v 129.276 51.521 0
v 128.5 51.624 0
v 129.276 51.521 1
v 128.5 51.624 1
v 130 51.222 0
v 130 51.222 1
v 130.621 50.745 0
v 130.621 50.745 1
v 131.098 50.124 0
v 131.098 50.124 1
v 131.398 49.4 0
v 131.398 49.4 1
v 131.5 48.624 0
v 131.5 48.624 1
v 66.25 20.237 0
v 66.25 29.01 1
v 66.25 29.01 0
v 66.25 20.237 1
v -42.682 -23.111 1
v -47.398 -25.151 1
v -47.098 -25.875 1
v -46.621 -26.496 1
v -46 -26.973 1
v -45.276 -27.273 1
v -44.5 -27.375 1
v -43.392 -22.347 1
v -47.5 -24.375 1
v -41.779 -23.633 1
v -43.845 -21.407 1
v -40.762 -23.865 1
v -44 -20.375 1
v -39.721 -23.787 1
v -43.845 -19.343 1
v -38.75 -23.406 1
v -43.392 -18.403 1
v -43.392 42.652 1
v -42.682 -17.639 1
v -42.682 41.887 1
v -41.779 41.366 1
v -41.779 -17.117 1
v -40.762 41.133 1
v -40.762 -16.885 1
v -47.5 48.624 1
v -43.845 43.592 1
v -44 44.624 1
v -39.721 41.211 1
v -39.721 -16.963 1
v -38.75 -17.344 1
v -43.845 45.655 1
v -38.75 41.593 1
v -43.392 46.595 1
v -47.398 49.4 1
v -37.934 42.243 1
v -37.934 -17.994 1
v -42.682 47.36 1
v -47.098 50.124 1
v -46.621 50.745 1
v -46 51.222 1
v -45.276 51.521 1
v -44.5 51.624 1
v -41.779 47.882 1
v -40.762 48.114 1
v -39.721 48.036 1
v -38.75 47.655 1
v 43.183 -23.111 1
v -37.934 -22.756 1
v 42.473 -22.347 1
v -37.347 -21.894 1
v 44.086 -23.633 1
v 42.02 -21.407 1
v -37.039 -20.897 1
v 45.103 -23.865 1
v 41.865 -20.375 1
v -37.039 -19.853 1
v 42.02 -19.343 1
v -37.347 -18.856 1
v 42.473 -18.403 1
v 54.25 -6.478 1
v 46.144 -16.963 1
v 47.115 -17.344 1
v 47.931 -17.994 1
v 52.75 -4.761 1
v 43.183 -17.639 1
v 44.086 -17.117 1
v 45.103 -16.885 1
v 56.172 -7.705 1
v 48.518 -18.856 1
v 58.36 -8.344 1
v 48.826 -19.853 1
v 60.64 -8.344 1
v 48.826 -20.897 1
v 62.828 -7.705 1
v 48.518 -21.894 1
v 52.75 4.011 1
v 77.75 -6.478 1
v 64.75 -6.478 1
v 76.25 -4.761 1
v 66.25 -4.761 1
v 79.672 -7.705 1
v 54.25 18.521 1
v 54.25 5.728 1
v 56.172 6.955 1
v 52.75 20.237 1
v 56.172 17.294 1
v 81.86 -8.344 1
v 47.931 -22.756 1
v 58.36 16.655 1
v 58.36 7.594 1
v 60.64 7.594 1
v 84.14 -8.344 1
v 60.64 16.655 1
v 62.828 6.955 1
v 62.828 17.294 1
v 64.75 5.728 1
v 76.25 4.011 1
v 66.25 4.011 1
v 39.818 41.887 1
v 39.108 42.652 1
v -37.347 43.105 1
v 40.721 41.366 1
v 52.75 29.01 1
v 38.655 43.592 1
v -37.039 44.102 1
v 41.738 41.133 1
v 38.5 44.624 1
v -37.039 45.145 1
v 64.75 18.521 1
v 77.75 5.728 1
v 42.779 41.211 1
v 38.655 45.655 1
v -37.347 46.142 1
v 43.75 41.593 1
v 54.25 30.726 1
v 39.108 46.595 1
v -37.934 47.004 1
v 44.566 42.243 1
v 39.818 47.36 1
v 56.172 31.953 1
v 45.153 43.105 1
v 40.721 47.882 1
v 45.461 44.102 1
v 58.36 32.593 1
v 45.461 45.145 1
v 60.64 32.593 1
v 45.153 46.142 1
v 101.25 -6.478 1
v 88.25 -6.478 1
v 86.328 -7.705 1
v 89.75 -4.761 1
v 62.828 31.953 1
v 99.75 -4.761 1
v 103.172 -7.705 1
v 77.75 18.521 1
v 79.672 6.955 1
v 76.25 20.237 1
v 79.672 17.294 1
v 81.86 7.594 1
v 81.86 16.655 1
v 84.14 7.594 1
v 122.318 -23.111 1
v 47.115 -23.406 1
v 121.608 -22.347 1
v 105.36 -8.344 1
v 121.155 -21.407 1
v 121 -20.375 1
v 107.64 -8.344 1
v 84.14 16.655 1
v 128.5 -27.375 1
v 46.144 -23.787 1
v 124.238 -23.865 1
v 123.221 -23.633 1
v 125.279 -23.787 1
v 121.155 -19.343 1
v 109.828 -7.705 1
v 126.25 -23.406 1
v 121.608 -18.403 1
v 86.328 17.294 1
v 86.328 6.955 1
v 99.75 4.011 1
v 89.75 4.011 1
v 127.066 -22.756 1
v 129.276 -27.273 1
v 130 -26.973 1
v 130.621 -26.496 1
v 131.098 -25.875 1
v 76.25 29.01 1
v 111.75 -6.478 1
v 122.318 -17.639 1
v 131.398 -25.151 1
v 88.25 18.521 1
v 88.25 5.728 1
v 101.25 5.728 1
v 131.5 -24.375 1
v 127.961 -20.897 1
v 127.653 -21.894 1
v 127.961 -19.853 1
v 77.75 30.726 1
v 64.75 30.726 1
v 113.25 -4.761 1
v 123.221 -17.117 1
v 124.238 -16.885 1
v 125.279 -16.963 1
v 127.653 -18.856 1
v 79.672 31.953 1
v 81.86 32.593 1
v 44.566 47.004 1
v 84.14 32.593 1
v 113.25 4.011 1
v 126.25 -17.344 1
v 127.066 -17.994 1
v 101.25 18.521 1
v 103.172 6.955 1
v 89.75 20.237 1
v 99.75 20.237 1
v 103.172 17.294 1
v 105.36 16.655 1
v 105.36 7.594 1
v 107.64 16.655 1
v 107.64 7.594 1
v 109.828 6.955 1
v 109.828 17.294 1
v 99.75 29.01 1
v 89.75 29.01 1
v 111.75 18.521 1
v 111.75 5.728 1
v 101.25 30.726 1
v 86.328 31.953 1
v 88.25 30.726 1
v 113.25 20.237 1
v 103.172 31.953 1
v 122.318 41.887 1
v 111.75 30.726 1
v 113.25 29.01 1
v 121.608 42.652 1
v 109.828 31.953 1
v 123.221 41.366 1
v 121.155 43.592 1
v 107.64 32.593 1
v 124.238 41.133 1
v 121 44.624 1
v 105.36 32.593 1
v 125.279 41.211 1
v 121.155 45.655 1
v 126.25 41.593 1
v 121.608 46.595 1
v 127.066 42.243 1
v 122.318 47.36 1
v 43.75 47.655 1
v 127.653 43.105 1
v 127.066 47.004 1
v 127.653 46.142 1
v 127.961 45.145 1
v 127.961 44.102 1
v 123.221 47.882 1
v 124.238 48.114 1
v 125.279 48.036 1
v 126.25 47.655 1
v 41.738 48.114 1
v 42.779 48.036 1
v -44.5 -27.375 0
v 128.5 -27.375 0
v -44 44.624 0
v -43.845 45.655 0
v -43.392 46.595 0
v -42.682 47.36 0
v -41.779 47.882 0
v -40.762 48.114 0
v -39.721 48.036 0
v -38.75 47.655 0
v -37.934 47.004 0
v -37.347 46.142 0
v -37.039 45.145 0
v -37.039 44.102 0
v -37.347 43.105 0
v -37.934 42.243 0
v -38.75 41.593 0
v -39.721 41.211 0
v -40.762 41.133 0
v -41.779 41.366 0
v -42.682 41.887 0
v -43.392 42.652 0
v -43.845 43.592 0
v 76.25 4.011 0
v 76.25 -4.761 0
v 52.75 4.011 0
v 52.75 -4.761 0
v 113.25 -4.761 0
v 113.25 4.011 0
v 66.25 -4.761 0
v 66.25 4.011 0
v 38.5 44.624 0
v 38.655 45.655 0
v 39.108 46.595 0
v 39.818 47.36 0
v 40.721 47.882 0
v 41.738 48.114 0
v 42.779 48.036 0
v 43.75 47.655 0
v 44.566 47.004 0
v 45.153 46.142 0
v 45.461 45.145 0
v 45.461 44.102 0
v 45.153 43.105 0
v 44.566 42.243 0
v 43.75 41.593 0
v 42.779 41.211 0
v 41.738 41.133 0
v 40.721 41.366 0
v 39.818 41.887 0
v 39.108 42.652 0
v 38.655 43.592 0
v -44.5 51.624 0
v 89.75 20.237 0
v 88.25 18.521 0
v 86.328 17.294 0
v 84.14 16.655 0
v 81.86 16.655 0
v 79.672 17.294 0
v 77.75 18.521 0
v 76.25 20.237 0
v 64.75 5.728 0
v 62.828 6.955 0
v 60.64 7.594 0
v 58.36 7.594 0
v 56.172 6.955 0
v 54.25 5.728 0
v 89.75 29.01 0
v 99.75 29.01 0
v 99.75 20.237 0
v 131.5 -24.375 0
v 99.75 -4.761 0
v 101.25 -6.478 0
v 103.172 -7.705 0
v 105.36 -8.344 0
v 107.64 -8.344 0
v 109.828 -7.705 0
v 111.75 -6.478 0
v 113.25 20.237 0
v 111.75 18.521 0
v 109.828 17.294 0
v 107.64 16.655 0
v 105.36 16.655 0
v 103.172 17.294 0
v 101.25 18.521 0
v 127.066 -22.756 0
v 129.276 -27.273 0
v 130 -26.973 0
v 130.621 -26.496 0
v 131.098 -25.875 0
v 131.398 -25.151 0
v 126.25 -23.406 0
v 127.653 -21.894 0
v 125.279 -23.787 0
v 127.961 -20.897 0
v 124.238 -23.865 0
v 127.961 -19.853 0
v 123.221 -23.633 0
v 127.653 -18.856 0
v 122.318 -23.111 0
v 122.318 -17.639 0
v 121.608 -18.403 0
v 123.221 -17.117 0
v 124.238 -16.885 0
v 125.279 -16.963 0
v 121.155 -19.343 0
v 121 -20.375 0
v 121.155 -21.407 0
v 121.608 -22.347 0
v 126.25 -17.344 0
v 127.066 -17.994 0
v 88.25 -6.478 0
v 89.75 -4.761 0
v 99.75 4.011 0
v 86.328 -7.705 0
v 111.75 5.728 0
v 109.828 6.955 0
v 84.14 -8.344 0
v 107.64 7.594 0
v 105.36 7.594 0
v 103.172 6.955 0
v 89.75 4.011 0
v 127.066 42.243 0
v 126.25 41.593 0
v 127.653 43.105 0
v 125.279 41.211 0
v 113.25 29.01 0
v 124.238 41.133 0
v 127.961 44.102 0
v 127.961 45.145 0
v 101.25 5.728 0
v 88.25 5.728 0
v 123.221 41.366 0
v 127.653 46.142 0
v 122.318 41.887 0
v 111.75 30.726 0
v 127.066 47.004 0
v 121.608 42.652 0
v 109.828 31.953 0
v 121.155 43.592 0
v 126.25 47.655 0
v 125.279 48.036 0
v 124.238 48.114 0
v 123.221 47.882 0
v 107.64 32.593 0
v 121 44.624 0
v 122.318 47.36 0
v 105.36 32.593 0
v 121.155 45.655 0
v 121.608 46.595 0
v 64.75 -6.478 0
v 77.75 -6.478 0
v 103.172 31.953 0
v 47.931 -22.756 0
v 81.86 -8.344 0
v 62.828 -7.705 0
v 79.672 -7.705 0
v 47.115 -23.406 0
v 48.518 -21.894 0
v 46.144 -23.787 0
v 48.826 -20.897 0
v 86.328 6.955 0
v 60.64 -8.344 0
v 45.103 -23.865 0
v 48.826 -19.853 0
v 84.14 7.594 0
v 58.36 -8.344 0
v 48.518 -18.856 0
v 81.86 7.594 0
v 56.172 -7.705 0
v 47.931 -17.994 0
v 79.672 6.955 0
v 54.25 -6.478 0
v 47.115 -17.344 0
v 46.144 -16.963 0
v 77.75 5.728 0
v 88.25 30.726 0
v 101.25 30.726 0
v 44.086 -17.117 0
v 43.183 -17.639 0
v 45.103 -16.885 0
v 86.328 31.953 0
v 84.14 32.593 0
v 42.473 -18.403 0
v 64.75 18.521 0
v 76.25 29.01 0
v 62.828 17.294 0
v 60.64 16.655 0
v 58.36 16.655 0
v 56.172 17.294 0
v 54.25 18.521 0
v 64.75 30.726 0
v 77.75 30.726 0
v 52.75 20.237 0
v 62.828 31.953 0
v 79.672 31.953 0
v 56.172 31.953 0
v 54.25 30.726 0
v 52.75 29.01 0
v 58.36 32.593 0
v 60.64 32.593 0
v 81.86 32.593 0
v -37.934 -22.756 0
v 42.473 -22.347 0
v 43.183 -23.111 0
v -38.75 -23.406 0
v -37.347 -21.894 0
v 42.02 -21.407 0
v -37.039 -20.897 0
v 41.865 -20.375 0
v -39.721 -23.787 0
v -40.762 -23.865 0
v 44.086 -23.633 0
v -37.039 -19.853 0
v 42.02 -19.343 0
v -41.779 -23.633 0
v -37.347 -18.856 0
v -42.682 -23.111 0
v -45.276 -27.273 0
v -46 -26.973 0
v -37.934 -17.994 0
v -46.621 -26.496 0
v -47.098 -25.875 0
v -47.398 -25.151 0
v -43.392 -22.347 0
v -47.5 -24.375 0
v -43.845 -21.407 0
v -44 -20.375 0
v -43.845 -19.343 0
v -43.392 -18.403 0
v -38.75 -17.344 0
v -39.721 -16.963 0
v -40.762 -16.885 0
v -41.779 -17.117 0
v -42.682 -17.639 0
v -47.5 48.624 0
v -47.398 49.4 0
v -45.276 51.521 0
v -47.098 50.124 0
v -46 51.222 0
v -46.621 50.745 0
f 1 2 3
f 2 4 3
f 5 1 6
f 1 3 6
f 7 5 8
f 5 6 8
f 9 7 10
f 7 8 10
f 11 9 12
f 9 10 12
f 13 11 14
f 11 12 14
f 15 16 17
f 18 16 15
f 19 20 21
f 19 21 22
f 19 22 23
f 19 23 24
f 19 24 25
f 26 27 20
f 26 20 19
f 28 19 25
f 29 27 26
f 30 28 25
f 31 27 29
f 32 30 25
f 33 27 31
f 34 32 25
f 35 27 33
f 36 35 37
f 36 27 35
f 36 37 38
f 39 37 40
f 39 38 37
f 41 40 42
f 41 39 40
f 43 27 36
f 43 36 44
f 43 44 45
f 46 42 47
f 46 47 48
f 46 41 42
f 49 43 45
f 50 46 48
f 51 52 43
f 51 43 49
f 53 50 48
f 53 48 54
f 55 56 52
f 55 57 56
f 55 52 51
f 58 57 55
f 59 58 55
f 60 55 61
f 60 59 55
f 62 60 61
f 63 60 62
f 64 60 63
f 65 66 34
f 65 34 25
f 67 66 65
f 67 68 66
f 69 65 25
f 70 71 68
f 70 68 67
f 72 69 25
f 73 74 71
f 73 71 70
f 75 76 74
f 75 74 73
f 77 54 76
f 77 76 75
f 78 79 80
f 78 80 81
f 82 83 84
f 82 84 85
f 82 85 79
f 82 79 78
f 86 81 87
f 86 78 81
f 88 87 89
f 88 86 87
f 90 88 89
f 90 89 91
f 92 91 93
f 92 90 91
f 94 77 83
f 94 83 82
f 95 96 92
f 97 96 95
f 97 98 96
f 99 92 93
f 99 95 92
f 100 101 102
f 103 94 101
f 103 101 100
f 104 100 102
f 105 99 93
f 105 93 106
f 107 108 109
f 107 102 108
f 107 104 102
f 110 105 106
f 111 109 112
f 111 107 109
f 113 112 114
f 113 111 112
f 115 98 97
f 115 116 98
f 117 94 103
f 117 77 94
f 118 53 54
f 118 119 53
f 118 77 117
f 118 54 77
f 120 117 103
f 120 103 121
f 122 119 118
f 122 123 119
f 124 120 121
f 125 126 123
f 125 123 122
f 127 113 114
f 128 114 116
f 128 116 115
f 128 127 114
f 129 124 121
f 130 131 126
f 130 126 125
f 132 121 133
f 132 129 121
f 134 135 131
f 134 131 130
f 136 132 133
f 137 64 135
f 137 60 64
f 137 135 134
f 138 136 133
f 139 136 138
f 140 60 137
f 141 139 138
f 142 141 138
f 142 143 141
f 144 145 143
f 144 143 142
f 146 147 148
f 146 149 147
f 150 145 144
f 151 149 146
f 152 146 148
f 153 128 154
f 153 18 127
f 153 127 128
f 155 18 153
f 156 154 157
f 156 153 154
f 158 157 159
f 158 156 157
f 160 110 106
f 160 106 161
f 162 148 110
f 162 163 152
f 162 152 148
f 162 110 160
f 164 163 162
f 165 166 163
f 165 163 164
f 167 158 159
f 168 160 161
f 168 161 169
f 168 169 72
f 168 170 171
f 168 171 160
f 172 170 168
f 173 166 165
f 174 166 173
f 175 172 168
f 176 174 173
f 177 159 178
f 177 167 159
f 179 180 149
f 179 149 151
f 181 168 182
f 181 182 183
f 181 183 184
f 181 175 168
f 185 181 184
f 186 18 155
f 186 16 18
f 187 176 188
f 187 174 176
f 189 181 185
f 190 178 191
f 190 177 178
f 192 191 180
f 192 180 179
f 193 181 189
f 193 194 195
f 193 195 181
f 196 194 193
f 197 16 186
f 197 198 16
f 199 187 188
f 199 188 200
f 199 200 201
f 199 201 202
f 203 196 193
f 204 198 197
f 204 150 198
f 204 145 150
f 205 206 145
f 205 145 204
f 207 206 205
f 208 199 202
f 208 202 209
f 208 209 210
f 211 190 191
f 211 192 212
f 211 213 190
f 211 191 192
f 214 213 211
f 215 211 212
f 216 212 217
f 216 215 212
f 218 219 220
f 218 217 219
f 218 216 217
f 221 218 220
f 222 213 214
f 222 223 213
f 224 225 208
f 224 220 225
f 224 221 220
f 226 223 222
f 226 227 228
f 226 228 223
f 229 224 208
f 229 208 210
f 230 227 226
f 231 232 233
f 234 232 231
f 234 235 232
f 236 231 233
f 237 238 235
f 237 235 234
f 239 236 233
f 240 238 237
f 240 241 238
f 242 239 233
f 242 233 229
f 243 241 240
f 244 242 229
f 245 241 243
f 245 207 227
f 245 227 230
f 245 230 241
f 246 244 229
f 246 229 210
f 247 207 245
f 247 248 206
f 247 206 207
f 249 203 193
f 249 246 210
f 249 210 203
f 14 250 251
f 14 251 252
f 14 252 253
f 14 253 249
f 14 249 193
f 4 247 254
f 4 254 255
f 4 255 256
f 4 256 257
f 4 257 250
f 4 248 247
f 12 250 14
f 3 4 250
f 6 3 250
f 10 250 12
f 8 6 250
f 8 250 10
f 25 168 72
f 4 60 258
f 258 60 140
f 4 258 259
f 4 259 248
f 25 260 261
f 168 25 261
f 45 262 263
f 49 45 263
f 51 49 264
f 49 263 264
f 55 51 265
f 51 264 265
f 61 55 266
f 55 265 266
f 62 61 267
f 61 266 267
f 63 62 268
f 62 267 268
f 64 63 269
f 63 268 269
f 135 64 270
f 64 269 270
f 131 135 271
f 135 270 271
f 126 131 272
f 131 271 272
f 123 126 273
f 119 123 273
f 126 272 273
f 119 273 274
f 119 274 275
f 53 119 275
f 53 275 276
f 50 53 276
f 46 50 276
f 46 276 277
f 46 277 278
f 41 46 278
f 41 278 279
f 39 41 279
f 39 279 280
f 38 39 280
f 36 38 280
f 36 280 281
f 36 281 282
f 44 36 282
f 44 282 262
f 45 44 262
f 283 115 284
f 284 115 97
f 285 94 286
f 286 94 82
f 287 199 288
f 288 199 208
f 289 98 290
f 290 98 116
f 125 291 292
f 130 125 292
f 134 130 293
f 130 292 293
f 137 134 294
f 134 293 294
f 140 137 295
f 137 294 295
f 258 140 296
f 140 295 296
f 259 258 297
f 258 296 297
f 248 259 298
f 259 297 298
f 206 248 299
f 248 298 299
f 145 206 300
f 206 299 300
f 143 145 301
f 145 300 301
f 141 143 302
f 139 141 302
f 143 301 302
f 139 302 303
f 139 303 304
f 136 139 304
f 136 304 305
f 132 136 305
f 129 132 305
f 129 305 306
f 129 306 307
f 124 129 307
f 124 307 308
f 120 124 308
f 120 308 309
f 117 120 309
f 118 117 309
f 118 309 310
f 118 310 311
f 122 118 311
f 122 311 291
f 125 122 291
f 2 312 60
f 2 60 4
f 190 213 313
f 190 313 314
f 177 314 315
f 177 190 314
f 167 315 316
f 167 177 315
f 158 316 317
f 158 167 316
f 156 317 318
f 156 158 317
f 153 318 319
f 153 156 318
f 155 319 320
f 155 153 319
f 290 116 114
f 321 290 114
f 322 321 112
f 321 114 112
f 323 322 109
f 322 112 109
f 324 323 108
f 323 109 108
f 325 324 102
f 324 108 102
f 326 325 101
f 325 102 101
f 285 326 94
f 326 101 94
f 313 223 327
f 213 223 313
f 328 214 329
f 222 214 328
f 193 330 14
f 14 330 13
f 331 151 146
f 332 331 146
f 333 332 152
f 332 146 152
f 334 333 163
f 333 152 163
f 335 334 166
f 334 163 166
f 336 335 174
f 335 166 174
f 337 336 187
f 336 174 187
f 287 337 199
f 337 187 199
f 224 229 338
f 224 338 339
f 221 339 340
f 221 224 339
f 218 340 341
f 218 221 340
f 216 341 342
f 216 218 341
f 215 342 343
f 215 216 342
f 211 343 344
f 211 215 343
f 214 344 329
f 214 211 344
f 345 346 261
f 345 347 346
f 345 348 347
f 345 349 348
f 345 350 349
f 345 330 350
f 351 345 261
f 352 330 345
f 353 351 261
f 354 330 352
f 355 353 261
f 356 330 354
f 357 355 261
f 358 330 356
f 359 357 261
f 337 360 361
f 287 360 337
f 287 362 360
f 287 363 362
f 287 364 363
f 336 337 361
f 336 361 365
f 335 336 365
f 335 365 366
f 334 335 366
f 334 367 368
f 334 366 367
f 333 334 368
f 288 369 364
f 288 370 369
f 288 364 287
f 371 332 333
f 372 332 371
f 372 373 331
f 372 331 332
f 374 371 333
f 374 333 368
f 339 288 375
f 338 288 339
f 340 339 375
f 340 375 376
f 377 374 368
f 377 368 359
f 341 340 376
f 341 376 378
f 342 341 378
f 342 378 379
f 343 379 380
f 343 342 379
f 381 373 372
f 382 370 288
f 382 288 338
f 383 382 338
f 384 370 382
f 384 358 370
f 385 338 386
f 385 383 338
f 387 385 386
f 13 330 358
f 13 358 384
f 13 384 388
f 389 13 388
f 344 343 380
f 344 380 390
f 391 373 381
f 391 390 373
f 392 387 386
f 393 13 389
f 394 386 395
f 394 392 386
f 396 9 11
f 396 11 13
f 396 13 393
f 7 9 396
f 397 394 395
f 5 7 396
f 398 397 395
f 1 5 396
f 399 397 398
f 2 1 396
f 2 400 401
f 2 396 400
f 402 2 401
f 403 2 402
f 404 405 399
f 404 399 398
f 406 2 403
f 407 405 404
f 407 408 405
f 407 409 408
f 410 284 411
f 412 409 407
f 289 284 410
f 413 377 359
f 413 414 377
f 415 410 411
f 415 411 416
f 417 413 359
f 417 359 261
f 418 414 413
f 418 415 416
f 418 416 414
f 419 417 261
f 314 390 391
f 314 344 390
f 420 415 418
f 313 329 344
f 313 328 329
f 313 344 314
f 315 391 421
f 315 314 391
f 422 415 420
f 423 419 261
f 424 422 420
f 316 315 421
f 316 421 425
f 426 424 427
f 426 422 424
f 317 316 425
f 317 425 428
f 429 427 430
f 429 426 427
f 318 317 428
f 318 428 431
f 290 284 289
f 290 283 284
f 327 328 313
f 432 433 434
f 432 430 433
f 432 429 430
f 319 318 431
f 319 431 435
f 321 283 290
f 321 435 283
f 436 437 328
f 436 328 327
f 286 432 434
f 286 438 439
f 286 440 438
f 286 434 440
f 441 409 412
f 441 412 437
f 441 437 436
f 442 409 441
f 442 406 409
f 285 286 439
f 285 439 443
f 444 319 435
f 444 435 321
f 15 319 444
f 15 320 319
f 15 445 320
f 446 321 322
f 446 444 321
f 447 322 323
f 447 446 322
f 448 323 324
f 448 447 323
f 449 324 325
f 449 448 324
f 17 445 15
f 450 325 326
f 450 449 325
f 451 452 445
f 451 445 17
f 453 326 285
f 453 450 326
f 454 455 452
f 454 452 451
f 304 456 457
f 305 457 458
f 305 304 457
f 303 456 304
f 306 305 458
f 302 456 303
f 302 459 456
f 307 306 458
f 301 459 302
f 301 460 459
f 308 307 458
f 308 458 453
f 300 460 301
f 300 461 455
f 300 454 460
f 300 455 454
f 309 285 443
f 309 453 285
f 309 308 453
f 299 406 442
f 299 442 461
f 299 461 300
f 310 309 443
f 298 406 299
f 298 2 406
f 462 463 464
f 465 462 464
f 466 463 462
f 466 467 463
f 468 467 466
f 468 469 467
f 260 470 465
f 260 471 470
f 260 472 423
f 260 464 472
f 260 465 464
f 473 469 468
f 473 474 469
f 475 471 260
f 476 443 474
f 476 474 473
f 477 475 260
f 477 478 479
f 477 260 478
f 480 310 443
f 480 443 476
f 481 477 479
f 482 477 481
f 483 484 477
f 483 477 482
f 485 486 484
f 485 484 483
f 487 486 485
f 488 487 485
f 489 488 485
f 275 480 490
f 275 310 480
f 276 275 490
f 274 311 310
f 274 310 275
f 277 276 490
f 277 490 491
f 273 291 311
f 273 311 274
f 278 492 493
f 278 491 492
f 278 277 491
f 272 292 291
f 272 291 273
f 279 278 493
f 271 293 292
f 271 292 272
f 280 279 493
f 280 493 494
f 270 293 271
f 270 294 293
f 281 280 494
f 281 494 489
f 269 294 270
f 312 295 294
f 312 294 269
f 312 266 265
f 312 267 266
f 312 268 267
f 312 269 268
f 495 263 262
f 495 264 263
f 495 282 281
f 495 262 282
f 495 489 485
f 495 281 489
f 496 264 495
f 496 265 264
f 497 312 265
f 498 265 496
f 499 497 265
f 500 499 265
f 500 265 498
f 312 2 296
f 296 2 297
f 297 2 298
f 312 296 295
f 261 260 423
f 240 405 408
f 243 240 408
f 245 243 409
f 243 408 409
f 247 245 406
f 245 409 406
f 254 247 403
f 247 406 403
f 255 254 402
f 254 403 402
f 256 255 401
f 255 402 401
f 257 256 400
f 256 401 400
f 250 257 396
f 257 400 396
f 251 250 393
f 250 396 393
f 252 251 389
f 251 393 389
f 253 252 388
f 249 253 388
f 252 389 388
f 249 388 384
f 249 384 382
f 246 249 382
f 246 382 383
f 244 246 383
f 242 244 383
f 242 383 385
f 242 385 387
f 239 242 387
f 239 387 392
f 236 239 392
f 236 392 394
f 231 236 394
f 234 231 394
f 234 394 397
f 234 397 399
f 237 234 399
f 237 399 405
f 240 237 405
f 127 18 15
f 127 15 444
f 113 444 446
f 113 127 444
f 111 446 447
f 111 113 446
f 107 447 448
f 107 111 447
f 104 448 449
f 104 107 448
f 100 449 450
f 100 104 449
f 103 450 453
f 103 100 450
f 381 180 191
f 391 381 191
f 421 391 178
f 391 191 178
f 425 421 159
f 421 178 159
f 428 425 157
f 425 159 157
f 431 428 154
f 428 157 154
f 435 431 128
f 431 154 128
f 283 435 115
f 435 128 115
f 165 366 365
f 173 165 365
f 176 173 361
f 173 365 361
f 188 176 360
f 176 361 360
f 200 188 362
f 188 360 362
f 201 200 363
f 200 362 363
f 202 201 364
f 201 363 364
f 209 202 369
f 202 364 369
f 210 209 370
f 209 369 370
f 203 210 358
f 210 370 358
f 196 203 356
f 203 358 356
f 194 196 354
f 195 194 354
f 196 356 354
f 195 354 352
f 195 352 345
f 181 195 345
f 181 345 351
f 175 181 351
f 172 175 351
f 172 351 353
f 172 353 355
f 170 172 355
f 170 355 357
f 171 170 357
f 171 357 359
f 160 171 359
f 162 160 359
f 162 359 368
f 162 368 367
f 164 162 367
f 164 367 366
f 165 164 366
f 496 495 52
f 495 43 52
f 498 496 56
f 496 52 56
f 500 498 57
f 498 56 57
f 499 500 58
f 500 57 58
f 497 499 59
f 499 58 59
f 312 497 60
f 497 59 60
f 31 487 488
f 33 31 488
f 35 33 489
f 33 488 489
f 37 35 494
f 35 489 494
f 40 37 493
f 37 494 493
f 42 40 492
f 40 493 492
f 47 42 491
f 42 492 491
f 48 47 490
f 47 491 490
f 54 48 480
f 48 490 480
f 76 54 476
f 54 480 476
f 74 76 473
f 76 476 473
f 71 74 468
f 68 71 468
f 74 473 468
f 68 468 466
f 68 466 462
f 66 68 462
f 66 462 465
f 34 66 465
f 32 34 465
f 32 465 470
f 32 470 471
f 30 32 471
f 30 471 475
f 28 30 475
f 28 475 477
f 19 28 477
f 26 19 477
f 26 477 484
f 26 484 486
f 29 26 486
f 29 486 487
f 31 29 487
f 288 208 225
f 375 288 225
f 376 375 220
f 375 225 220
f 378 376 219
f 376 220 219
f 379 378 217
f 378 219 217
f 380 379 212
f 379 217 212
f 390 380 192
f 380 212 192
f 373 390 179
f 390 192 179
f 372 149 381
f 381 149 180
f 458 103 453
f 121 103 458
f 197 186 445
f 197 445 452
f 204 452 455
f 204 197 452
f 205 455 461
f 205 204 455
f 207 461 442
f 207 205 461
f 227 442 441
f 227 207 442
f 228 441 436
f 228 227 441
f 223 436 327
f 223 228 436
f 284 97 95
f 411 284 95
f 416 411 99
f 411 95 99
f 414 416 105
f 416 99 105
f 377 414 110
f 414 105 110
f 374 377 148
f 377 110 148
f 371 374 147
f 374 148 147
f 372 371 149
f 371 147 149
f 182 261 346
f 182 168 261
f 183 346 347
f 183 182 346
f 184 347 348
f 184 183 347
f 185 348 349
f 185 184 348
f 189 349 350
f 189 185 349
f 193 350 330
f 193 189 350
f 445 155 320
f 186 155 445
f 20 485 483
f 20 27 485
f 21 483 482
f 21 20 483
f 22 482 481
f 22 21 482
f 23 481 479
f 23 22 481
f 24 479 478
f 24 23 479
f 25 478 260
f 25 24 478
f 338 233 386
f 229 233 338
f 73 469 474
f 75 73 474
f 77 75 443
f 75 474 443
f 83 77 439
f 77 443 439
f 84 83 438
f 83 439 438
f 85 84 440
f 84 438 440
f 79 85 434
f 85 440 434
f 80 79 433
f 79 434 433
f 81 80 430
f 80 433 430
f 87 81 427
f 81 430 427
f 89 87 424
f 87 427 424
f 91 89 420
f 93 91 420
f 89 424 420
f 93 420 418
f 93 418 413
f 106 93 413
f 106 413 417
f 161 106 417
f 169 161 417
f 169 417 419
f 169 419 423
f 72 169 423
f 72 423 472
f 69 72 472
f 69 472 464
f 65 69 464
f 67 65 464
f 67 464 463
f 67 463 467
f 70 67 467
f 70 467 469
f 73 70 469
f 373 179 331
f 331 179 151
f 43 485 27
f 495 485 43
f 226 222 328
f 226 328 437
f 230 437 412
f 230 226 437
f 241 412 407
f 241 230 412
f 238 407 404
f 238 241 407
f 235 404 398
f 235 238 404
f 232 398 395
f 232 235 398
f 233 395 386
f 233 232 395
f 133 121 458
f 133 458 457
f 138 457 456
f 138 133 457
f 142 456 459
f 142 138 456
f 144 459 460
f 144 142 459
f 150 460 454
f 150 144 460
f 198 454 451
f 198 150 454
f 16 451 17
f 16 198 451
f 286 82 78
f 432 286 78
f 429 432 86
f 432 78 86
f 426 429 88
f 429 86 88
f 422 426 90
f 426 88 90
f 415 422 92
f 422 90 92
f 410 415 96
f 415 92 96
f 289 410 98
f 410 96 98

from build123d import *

# Parameters (mm, degrees)
SKETCH1_W                = 179
SKETCH1_H                = 78.998711306
BOSS_EXTRUDE1_DEPTH      = 1
FILLET1_R                = 3
CUT_EXTRUDE1_DEPTH       = 142.273697371
F_7_0_7_DIAMETER_HOLE1_D = 7
LPATTERN1_COUNT          = 3
LPATTERN1_PITCH          = 23.5
LPATTERN1_COPY_1_DEPTH   = 142.273697371
LPATTERN1_COPY_2_DEPTH   = 142.273697371


with BuildPart() as part:
    # Sketch1 → Boss-Extrude1 (new body)
    with BuildSketch(Plane.XY):
        with Locations((42, 12.124355653)):
            Rectangle(SKETCH1_W, SKETCH1_H)
    extrude(amount=BOSS_EXTRUDE1_DEPTH)

    # Fillet1
    fillet1_edges = [part.edges().sort_by_distance(p)[0] for p in [
        (131.5, -27.375, 0.5),
        (-47.5, -27.375, 0.5),
        (-47.5, 51.623711306, 0.5),
        (131.5, 51.623711306, 0.5),
    ]]
    fillet(fillet1_edges, radius=FILLET1_R)

    # Sketch4 → Cut-Extrude1 (cut, through all)
    with BuildSketch(Plane.XY.offset(1)):
        with BuildLine():
            Line((113.25, 20.237368866), (113.25, 29.010053746))
            ThreePointArc((113.25, 29.010053746), (106.5, 32.673711306), (99.75, 29.010053746))
            Line((99.75, 29.010053746), (99.75, 20.237368866))
            ThreePointArc((99.75, 20.237368866), (106.5, 16.573711306), (113.25, 20.237368866))
        make_face()
    cut_extrude1 = extrude(amount=-CUT_EXTRUDE1_DEPTH, mode=Mode.SUBTRACT)

    # Ø7.0 (7) Diameter Hole1 (through all)
    with Locations(Plane.XY.offset(1)):
        with Locations((42, 44.623711306), (-40.5, 44.623711306), (124.5, 44.623711306), (124.5, -20.375), (45.364988053, -20.375), (-40.5, -20.375)):
            Hole(F_7_0_7_DIAMETER_HOLE1_D / 2)

    # Mirror1: Cut-Extrude1 across plane
    add(cut_extrude1.mirror(Plane.ZX.offset(12.124355653)), mode=Mode.SUBTRACT)

    # LPattern1: Cut-Extrude1 ×3
    with Locations(*[(-i * LPATTERN1_PITCH, 0, 0) for i in range(1, LPATTERN1_COUNT)]):
        add(cut_extrude1, mode=Mode.SUBTRACT)

    # LPattern1 copy 1 sketch → LPattern1 copy 1 (cut, through all)
    with BuildSketch(Plane(origin=(-23.5, 24.248711306, 1), x_dir=(1, 0, 0), z_dir=(0, 0, 1))):
        with BuildLine():
            Line((113.25, -20.237368866), (113.25, -29.010053746))
            ThreePointArc((113.25, -29.010053746), (106.5, -32.673711306), (99.75, -29.010053746))
            Line((99.75, -29.010053746), (99.75, -20.237368866))
            ThreePointArc((99.75, -20.237368866), (106.5, -16.573711306), (113.25, -20.237368866))
        make_face()
    extrude(amount=-LPATTERN1_COPY_1_DEPTH, mode=Mode.SUBTRACT)

    # LPattern1 copy 2 sketch → LPattern1 copy 2 (cut, through all)
    with BuildSketch(Plane(origin=(-47, 24.248711306, 1), x_dir=(1, 0, 0), z_dir=(0, 0, 1))):
        with BuildLine():
            Line((113.25, -20.237368866), (113.25, -29.010053746))
            ThreePointArc((113.25, -29.010053746), (106.5, -32.673711306), (99.75, -29.010053746))
            Line((99.75, -29.010053746), (99.75, -20.237368866))
            ThreePointArc((99.75, -20.237368866), (106.5, -16.573711306), (113.25, -20.237368866))
        make_face()
    extrude(amount=-LPATTERN1_COPY_2_DEPTH, mode=Mode.SUBTRACT)


solid = part.part
